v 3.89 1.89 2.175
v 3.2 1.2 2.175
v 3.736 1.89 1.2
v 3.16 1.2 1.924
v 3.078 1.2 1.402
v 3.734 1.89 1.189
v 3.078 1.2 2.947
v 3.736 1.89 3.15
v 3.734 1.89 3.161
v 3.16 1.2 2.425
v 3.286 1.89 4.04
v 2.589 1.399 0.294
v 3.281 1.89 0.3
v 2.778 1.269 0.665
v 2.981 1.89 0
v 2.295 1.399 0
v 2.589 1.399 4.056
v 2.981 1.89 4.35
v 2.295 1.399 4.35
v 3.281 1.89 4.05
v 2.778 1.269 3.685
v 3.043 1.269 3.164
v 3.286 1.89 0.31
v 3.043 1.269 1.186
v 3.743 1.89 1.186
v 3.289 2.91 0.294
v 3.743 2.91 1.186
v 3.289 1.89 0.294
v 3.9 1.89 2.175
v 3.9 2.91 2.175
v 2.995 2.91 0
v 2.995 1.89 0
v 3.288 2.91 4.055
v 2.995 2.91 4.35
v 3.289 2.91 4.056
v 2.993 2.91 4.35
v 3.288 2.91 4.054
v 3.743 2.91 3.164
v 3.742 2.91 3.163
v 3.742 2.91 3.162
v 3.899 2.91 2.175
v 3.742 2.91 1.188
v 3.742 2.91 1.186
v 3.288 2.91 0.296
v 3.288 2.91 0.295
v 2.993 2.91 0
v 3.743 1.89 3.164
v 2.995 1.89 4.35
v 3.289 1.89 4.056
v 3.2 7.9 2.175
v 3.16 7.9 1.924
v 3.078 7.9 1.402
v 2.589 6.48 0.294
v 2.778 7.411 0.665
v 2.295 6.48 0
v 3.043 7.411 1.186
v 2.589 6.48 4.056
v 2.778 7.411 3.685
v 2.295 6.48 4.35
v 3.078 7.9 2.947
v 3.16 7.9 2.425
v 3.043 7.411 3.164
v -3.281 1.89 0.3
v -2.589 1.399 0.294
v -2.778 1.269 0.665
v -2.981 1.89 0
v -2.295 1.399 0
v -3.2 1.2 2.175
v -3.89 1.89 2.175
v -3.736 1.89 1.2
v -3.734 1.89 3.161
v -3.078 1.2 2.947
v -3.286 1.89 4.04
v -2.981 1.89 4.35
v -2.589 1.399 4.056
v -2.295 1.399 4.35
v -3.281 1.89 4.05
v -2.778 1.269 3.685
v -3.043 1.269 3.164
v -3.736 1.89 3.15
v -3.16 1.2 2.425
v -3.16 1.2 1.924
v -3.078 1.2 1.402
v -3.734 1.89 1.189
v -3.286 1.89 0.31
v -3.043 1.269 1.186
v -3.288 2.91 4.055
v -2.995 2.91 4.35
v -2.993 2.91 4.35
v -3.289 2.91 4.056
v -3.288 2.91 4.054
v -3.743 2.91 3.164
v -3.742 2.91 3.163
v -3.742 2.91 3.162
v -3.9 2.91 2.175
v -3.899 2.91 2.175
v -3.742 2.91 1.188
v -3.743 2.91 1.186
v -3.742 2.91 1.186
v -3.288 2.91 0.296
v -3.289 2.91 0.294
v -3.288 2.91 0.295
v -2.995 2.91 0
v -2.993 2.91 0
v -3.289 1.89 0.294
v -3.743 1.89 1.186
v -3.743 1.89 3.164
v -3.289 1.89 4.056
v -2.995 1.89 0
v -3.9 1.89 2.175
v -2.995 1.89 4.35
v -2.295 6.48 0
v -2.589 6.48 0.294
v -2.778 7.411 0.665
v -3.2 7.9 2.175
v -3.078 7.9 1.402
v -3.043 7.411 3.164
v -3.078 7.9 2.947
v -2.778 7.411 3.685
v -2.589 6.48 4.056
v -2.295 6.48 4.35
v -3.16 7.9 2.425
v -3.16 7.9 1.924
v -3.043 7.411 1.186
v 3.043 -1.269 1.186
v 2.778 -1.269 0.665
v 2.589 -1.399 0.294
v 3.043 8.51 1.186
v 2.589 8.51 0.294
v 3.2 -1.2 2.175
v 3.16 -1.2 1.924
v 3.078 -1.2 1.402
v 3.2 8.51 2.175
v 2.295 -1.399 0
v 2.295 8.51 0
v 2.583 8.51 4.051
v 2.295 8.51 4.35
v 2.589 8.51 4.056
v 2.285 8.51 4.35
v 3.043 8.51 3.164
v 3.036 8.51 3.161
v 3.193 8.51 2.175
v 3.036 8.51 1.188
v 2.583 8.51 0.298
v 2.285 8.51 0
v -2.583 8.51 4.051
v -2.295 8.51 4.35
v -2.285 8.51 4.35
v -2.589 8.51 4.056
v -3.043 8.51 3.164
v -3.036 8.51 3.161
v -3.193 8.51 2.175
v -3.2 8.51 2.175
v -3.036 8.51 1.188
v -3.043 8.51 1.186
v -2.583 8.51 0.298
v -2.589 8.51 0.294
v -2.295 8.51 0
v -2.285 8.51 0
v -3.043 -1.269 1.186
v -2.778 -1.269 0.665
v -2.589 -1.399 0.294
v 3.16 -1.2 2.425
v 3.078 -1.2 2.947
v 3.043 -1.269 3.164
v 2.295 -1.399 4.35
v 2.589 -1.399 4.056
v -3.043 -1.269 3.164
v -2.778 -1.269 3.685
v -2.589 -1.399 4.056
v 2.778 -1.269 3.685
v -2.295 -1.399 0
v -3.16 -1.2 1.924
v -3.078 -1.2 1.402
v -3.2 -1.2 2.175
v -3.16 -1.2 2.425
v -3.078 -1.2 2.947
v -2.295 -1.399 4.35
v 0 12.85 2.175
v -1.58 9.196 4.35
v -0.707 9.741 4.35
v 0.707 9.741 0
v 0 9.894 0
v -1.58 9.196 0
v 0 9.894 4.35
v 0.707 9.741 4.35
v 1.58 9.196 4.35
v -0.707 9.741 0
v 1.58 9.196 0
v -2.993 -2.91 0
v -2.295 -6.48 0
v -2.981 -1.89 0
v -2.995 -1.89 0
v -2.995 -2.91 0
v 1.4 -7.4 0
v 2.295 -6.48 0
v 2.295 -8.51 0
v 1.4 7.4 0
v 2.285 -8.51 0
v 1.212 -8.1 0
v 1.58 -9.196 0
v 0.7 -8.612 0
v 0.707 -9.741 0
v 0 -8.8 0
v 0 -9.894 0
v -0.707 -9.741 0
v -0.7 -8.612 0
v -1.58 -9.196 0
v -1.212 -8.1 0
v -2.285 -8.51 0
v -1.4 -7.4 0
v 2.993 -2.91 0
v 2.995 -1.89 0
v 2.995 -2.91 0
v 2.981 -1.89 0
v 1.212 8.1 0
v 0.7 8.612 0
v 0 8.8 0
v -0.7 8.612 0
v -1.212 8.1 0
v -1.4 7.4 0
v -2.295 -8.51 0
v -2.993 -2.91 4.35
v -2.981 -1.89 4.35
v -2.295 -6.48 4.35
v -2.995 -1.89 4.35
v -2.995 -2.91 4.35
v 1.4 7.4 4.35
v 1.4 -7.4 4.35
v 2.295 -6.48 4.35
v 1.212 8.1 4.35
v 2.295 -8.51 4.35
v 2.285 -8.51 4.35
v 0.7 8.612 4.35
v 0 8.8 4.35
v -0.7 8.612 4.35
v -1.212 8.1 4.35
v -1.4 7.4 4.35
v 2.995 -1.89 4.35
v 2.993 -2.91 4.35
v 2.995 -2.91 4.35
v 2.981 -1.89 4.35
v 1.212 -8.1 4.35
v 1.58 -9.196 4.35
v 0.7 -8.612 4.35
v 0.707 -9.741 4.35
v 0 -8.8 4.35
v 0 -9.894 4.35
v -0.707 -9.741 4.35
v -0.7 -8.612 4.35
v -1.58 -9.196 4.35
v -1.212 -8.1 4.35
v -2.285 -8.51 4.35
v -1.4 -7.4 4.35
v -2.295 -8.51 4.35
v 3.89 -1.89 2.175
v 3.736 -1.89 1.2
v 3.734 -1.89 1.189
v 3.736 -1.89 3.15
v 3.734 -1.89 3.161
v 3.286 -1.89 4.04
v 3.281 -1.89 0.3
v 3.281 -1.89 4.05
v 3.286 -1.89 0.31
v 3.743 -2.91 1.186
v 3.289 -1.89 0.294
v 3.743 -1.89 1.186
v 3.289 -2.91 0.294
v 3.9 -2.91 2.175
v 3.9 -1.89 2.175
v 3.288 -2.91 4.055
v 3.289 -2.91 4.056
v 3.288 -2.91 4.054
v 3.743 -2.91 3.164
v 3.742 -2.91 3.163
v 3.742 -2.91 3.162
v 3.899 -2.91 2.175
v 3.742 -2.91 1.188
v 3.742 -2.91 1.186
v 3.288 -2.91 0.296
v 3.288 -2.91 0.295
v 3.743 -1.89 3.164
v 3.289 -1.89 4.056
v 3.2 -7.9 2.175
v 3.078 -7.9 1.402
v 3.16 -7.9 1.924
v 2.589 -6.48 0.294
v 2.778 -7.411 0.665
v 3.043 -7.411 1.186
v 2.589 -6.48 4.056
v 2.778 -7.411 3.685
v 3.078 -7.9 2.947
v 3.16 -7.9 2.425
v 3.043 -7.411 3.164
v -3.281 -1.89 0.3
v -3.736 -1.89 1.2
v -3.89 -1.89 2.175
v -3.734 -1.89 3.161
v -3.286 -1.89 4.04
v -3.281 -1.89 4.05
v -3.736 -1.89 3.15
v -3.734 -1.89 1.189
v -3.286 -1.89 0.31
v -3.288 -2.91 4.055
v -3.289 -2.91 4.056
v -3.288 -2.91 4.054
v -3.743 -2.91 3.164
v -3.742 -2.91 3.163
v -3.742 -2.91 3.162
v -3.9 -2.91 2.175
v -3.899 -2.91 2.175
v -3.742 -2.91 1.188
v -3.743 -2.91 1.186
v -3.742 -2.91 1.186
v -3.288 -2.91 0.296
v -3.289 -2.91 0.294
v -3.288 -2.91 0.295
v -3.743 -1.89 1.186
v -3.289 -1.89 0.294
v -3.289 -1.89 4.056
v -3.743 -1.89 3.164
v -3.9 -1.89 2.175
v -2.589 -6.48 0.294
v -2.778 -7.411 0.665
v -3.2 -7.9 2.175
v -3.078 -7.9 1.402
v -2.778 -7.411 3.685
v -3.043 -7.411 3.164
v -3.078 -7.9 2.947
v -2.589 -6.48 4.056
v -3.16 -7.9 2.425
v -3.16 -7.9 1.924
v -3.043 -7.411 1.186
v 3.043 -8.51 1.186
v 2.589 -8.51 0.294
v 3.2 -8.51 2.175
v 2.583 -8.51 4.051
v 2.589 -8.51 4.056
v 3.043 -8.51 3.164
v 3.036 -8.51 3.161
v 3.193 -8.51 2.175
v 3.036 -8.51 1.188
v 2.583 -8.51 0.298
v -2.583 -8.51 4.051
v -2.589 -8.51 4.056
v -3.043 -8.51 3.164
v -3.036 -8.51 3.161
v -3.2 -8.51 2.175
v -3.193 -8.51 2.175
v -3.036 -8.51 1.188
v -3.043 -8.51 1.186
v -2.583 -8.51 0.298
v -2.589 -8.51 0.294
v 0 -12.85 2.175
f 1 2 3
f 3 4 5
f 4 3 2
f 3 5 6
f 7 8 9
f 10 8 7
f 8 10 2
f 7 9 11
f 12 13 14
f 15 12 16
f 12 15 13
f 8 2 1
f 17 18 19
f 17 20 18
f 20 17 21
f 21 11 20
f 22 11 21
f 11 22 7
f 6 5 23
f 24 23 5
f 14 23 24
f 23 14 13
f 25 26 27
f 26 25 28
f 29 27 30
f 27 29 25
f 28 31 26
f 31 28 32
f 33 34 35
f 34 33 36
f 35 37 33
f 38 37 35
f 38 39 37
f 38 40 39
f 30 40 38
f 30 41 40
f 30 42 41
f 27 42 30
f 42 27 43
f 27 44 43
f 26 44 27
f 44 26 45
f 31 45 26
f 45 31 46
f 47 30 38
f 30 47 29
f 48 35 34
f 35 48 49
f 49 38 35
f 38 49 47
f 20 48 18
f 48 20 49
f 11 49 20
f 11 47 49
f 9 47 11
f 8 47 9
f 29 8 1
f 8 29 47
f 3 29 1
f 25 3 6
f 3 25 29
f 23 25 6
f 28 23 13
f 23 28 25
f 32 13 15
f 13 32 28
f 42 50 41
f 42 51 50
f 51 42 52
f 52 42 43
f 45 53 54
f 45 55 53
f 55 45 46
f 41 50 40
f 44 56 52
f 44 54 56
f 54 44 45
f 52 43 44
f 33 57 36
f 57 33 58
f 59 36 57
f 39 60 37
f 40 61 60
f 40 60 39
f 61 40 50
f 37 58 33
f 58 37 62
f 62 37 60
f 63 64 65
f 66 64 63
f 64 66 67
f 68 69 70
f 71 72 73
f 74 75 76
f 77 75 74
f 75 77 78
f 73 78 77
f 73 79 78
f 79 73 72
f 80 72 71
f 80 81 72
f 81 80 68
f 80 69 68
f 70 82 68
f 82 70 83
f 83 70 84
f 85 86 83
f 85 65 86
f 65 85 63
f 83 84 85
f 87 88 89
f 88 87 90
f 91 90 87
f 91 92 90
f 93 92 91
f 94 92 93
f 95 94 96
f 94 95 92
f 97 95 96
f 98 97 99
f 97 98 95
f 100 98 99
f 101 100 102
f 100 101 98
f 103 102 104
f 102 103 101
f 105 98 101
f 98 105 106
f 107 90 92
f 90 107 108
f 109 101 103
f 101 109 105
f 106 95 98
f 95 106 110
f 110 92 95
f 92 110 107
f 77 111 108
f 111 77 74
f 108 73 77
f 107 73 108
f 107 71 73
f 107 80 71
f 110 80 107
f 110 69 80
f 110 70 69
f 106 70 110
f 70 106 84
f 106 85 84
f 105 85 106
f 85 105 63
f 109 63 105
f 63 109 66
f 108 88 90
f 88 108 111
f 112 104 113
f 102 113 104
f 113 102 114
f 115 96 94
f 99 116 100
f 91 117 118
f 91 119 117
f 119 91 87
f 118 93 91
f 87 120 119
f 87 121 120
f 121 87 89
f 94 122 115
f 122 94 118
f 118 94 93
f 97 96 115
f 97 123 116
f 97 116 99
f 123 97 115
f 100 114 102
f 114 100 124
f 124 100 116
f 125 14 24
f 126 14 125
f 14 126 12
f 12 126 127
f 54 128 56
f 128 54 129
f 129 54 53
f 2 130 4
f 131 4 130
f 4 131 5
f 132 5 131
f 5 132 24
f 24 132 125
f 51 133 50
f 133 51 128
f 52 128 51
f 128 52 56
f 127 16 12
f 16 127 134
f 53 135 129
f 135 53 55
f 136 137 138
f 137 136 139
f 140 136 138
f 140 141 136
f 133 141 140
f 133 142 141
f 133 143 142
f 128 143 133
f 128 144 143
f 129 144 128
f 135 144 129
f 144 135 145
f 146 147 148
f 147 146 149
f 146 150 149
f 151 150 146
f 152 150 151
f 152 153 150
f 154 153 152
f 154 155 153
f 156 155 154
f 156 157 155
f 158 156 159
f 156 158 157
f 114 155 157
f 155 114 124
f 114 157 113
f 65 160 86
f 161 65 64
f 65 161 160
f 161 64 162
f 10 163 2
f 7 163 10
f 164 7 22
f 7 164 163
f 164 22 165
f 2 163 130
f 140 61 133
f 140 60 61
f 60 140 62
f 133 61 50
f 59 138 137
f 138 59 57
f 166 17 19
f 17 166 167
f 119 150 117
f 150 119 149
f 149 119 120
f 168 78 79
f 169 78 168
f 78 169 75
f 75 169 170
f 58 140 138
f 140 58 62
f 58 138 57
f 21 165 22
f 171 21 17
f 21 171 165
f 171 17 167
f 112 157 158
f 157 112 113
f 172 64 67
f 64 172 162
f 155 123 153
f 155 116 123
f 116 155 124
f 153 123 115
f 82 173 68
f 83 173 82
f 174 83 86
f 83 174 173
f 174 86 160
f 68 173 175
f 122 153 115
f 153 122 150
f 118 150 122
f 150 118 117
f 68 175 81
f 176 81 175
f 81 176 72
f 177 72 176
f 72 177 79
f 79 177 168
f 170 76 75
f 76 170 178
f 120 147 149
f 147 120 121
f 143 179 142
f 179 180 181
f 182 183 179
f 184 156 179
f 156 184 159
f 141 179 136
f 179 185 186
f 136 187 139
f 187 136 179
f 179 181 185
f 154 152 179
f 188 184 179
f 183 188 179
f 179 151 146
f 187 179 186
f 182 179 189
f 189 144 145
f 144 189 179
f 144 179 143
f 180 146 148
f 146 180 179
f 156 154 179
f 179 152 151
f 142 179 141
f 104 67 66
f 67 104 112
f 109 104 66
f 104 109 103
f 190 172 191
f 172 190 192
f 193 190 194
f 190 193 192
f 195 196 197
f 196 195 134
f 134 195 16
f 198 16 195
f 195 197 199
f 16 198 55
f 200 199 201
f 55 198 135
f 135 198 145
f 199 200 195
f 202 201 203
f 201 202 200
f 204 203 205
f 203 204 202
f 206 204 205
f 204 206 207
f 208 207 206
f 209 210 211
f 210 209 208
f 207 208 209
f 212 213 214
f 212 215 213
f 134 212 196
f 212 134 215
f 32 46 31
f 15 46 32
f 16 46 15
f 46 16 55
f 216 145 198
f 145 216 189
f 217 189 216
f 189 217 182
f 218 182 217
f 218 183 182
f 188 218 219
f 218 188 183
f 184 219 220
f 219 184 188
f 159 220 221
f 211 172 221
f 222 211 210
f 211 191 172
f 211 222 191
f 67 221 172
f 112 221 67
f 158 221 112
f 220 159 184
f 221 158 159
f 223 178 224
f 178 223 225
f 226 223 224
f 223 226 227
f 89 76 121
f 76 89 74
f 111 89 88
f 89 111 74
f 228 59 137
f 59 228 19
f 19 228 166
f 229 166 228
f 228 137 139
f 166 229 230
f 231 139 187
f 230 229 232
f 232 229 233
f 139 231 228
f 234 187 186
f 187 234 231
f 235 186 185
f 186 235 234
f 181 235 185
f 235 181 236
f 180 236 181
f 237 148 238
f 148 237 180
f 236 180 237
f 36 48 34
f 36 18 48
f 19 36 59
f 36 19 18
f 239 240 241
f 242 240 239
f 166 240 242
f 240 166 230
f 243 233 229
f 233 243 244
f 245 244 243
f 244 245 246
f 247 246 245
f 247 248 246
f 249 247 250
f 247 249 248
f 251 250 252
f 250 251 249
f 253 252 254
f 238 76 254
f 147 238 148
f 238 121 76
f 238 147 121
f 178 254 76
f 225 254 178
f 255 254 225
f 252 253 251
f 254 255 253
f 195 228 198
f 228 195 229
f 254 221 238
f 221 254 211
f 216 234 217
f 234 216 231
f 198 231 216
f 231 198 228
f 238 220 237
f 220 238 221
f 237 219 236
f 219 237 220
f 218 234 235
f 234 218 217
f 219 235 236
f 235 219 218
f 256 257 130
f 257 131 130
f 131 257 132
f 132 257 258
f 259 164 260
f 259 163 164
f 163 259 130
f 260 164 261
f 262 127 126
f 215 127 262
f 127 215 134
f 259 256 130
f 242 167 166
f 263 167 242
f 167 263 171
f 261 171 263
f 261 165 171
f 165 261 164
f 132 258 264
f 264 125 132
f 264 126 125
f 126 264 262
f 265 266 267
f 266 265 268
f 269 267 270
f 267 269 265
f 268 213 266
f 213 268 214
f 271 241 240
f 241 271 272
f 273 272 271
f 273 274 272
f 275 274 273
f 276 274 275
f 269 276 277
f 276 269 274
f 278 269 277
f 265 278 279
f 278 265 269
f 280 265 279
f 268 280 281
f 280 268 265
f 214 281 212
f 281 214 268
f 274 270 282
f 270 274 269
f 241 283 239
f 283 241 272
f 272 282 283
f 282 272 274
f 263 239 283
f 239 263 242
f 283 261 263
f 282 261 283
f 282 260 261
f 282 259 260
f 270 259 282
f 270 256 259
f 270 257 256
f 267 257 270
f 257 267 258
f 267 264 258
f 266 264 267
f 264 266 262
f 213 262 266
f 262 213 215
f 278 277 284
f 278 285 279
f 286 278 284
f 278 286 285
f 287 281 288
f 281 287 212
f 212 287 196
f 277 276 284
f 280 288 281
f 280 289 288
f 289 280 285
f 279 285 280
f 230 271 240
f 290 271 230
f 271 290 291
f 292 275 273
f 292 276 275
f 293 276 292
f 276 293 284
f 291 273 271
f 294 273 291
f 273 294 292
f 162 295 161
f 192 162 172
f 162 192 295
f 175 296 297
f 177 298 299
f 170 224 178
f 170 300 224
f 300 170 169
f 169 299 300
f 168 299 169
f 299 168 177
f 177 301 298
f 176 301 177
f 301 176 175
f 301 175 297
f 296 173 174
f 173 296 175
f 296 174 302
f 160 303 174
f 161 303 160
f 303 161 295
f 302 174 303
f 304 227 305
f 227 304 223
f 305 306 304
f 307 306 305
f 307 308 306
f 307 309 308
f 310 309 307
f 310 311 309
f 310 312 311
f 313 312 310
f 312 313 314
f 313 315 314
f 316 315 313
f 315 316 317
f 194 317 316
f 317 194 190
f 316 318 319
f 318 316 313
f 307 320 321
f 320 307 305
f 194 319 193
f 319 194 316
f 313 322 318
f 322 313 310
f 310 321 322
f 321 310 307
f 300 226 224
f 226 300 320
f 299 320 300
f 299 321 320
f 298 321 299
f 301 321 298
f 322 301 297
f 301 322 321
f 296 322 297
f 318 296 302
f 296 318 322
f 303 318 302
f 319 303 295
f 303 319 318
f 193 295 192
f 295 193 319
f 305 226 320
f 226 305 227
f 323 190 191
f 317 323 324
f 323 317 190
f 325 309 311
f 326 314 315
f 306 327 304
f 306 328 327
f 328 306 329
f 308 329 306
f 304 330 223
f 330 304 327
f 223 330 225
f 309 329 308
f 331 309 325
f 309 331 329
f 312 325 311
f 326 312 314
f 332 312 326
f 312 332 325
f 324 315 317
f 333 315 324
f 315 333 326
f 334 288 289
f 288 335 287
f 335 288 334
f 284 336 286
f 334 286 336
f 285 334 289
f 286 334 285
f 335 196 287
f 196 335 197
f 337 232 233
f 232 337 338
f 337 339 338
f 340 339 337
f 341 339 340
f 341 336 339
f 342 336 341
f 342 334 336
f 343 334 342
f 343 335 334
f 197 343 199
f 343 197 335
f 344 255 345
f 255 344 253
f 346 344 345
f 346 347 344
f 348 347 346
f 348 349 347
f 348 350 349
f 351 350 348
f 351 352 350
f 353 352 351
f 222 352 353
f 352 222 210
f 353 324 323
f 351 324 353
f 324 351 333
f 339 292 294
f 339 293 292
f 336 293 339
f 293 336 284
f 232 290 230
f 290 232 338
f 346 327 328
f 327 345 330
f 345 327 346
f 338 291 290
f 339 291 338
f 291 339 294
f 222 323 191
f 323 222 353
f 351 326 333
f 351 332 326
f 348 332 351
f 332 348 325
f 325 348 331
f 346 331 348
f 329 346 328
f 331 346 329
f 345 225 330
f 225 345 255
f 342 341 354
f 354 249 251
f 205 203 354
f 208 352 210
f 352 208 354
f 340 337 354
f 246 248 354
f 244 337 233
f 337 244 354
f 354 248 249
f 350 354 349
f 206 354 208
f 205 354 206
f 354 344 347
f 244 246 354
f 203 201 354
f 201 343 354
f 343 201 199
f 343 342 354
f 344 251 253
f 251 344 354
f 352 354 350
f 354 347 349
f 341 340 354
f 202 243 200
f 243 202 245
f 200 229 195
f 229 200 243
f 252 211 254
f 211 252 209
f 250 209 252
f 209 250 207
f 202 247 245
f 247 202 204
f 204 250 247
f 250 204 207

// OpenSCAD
// file: pin2.scad
// new pin connectors

object=0;//[0:Pinpeg,1:Pinhole]
//Pinpeg is twice this length
length=13;
//Of hole; pinpeg is smaller to fit
diameter=7;
//Only affects pinhole
hole_twist=0;//[0:free,1:fixed]
//Pulls the snaps together on the pinpeg to ensure a tight coupling
preload=0.1;
//Allows pins to fit easily into holes
clearance=0.3;
//Thicker makes the pinpeg stiffer
thickness=1.8;
//Height of snap nubs
snap=0.4;
//Put fins on pinhole to help with printing strength
fins=1;//[1:yes,0:no]

$fn=20;

if(object==0)pinpeg(r=diameter/2,l=length,d=2.5-preload,nub=snap,t=thickness,space=clearance);
if(object==1)pinhole(r=diameter/2,l=length,nub=snap,fixed=hole_twist,fins=fins);

//pin(flat=0);
//%pinhole(fixed=true);

//pinpeg();
//translate([10,0,0])difference(){
//	cylinder(r=5.5,h=14);
//	pinhole(fixed=true);
//}
//translate([-10,0,0])difference(){
//	cylinder(r=5.5,h=14);
//	pinhole(fixed=false);
//}

module pin(r=3.5,l=13,d=2.4,slot=10,nub=0.4,t=1.8,space=0.3,flat=1)
translate(flat*[0,0,r/sqrt(2)-space])rotate((1-flat)*[90,0,0])
difference(){
	rotate([-90,0,0])intersection(){
		union(){
			translate([0,0,-0.01])cylinder(r=r-space,h=l-r-0.98);
			translate([0,0,l-r-1])cylinder(r1=r-space,r2=0,h=r-space/2+1);
			translate([nub+space,0,d])nub(r-space,nub+space);
			translate([-nub-space,0,d])nub(r-space,nub+space);
		}
		cube([3*r,r*sqrt(2)-2*space,2*l+3*r],center=true);
	}
	translate([0,d,0])cube([2*(r-t-space),slot,2*r],center=true);
	translate([0,d-slot/2,0])cylinder(r=r-t-space,h=2*r,center=true,$fn=12);
	translate([0,d+slot/2,0])cylinder(r=r-t-space,h=2*r,center=true,$fn=12);
}

module nub(r,nub)
union(){
	translate([0,0,-nub-0.5])cylinder(r1=r-nub,r2=r,h=nub);
	cylinder(r=r,h=1.02,center=true);
	translate([0,0,0.5])cylinder(r1=r,r2=r-nub,h=5);
}

module pinhole(r=3.5,l=13,d=2.5,nub=0.4,fixed=false,fins=true)
intersection(){
	union(){
		translate([0,0,-0.1])cylinder(r=r,h=l-r+0.1);
		translate([0,0,l-r-0.01])cylinder(r1=r,r2=0,h=r);
		translate([0,0,d])nub(r+nub,nub);
		if(fins)translate([0,0,l-r]){
			cube([2*r,0.01,2*r],center=true);
			cube([0.01,2*r,2*r],center=true);
		}
	}
	if(fixed)cube([3*r,r*sqrt(2),2*l+3*r],center=true);
}

module pinpeg(r=3.5,l=13,d=2.4,nub=0.4,t=1.8,space=0.3)
union(){
	pin(r=r,l=l,d=d,nub=nub,t=t,space=space,flat=1);
	mirror([0,1,0])pin(r=r,l=l,d=d,nub=nub,t=t,space=space,flat=1);
}
// main file
use <pin2.scad>

pinSize = [8, 8, 13];
legHeight = 25;
spacing = 1;

//difference(){
//    cube([pinSize[0]+2*spacing,pinSize[1]+2*spacing, legHeight]);
//        translate([pinSize[0]/2+spacing, pinSize[0]/2+spacing, 0]) { 
//        pinhole(fixed=true);
//}

pinpeg();
